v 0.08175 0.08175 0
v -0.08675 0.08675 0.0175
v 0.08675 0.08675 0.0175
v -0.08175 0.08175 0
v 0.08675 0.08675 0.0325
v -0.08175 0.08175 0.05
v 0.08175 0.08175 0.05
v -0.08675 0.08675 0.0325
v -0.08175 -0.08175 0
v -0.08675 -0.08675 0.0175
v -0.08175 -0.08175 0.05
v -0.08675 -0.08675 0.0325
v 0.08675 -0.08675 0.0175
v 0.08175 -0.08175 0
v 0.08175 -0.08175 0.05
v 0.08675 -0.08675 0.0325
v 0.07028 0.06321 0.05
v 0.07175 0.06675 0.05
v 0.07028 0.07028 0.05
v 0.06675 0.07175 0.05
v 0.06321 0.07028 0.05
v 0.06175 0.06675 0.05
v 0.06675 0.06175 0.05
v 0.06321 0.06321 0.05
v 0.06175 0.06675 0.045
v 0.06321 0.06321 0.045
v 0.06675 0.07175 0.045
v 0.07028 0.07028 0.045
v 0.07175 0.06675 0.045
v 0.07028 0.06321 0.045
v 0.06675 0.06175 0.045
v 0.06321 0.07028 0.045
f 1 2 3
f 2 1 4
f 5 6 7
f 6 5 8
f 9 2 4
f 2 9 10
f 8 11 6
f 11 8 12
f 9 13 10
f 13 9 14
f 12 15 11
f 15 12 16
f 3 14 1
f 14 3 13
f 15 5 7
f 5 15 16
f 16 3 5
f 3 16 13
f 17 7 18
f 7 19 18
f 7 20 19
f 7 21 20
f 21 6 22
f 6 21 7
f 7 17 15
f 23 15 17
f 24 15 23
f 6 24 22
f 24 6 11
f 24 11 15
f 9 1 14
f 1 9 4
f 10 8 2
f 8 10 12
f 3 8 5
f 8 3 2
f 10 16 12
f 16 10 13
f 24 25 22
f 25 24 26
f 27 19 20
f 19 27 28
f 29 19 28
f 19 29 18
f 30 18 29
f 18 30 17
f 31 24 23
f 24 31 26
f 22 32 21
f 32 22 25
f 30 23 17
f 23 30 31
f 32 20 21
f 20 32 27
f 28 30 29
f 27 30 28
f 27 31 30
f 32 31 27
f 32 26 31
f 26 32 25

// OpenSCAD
// file: FPGAHousing_base.scad
include <FPGA_shared.scad>;
use <FPGAHousing_paintcap.scad>;
use <PowerSymbol.scad>;
use <DataSymbol.scad>;

module FPGAHousing_chipcutout() {
  slotPinBaseOffset = (-slotPinEdgeCount-1)/2 * slotPinEdgeSpacing;
  slotPinEdgeOffset = slotSize/2 - slotPinSize/2 - slotPinEdgePad;
  union() {
    translate([0, 0, baseDepth/2 + slotBottom + slotPinDepth]) {
      cube(size=[slotSize, slotSize, baseDepth], center=true);
    }
    for(edge=[1:4]) rotate([0,0,90*edge]) {
      for(i=[1:slotPinEdgeCount]) {
        translate([
          slotPinBaseOffset + slotPinEdgeSpacing*i,
          slotPinEdgeOffset,
          slotBottom + slotPinDepth
        ]) {
          cube(size=[slotPinSize, slotPinSize, slotPinDepth*2], center=true);
        }
      }
    }
    translate([alignHoleOffset,alignHoleOffset,slotBottom + slotPinDepth])
      cylinder(h=alignHoleDepth*2, r=alignHoleRadius, center=true, $fn=alignHoleSides);
  }
}

module FPGAHousing_base() {
  middleSize = (slotSize + capSize) / 2;
  difference() {
    union() {
      translate([0,0,baseCenter])
        cube(size=[baseSize, baseSize, baseDepth], center=true);
      translate([0,0,baseTop-eps])
        cube(size=[middleSize, middleSize, capDepth*2], center=true);
    }
    translate([0,0,baseBottom])
      cube(size=[baseBackCutoutSize, baseBackCutoutSize, baseBackCutoutDepth*2], center=true);
    FPGAHousing_chipcutout();
  }
}

FPGAHousing_base();
%FPGAHousing_paintcap();
// file: Text_shared.scad
char_depth = 0.0001;

char_pixelsz = 0.02/5;
char_pheight = 5;
char_max_pwidth = 5;

function sum(list) = list * [for (_=list) 1];
function partialsum(list, end) = list * [for (i=[0:len(list)-1]) i < end ? 1 : 0];

module _Text_Line(a, b) {
  l = norm(b-a);
  f = l > 0 ? (b-a)/l : [1, 0];
  r = [f.y, -f.x];
  ea = -0.5*f;
  eb = (l+0.5)*f;
  sr = 0.5*r;
  sl = -sr;
  polygon([
    a+ea+sr,
    a+eb+sr,
    a+eb+sl,
    a+ea+sl,
  ]*char_pixelsz);
}

module _Text_Segments(pts, off=[0,0]) {
  for (i=[0:len(pts)-2]) {
    pa = pts[i];
    pb = pts[i+1];
    if (len(pa) == 2 && len(pb) == 2)
      _Text_Line(pts[i]+off, pts[i+1]+off);
  }
}

_Letters = [
  [[-2, -2], [-2, 2], [2, 2], [2, -2], [2, 0], [-2, 0]], // A
  [], // B
  [[2, -2], [-2, -2], [-2, 2], [2, 2]], // C
  [[2, 0.5], [2, -2], [-2, -2], [-2, 2], [0.5, 2], [], [3, 0], [0, 3]], // D
  [[2, -2], [-2, -2], [-2, 2], [2, 2], [], [-2, 0], [0, 0]], // E
  [[2, 2], [-2, 2], [-2, -2], [-2, 0], [0, 0]], // F
  [[0, 0], [2, 0], [2, -2], [-2, -2], [-2, 2], [2, 2]], // G
  [], // H
  [[0, -2], [0, 2]], // I
  [], // J
  [], // K
  [[-2, 2], [-2, -2], [2, -2]], // L
  [], // M
  [], // N
  [[-2, -2], [-2, 2], [2, 2], [2, -2], [-2, -2]], // O
  [[-2, -2], [-2, 2], [2, 2], [2, 0], [-2, 0]], // P
  [], // Q
  [[-2, -2], [-2, 2], [2, 2], [2, 0], [-2, 0], [1, -3]], // R
  [], // S
  [], // T
  [], // U
  [], // V
  [], // W
  [], // X
  [], // Y
  [], // Z
  [[-2, 2], [2, 2], [2, 0], [0, 0], [], [0, -2], [0, -2]], // ? for missing
];

function _Letter_Lookup(c) =
  let(
    ci=ord(c),
    li=ci-ord("A"),
    issp=ci==32,
    lps=li>=0&&li<26 ? _Letters[li] : [],
    lpf=len(lps)==0 ? _Letters[26] : lps
  ) issp ? [] : lpf;

function _Letter_Bounds(letter) =
  let(
    fletter = concat([[0, 0]], [for (l=letter) len(l)==2 ? l : [0,0]]),
    xs = [for (l=fletter) l.x],
    ys = [for (l=fletter) l.y]
  ) [min(xs), min(ys), max(xs), max(ys)];

module Text(letters) {
  lbounds = [for (l=letters) _Letter_Bounds(l)];
  lwidths = [for (b=lbounds) min(b.z-b.x+1, char_max_pwidth)];
  lmins = [for (b=lbounds) b.x];
  twid = sum(lwidths) + len(letters)-1;
  startoff = (1-twid)/2;
  offs = [for (i=[0:len(letters)-1]) startoff+i+partialsum(lwidths, i)];
  linear_extrude(height=char_depth) {
    for (i=[0:len(letters)-1]) if (len(letters[i]) > 0) {
      letter = letters[i];
      off = offs[i];
      left = off-lmins[i];
      wid = lwidths[i];
      intersection() {
        _Text_Segments(letter, [left, 0]);
        scale([char_pixelsz,char_pixelsz]) translate([off-0.5, -char_pheight/2])
          square(size=[wid, char_pheight]);
      }
    }
  }
}

module Text(text) {
  letters = [for (c=text) _Letter_Lookup(c)];
  lbounds = [for (l=letters) _Letter_Bounds(l)];
  lwidths = [for (b=lbounds) min(b.z-b.x+1, char_max_pwidth)];
  lmins = [for (b=lbounds) b.x];
  twid = sum(lwidths) + len(letters)-1;
  startoff = (1-twid)/2;
  offs = [for (i=[0:len(letters)-1]) startoff+i+partialsum(lwidths, i)];
  linear_extrude(height=char_depth) {
    for (i=[0:len(letters)-1]) if (len(letters[i]) > 0) {
      letter = letters[i];
      off = offs[i];
      left = off-lmins[i];
      wid = lwidths[i];
      intersection() {
        _Text_Segments(letter, [left, 0]);
        scale([char_pixelsz,char_pixelsz]) translate([off-0.5, -char_pheight/2])
          square(size=[wid, char_pheight]);
      }
    }
  }
}
// file: Text_FPGALOGIC.scad
include <Text_shared.scad>;

module Text_FPGALOGIC() {
  Text("FPGA LOGIC");
}

Text_FPGALOGIC();
// file: DataSymbol.scad
boxSize = 0.029;
lineSize = 0.0045;
symDepth = 0.01;
vertSeparation = 0.019;
horizSeparation = 0.018;

module DataSymbol() {
  boxVertCenter = (boxSize+vertSeparation)/2;
  boxHorizCenter = (boxSize+horizSeparation)/2;
  linear_extrude(symDepth, center=true) {
    translate([0,boxVertCenter]) square(boxSize, center=true); // top box
    translate([-boxHorizCenter,-boxVertCenter]) square(boxSize, center=true); // bottom left box
    translate([boxHorizCenter,-boxVertCenter]) square(boxSize, center=true); // bottom right box
    square([2*boxHorizCenter + lineSize, lineSize], center=true); // middle line
    translate([0, horizSeparation/4]) square([lineSize, horizSeparation/2 + lineSize], center=true); // line to top
    translate([-boxHorizCenter, -horizSeparation/4]) square([lineSize, horizSeparation/2 + lineSize], center=true); // line to bottom left
    translate([boxHorizCenter, -horizSeparation/4]) square([lineSize, horizSeparation/2 + lineSize], center=true); // line to bottom right
  }
}

DataSymbol();
// file: PowerSymbol.scad
symWidth = 0.038;
symHeight = 0.086;
symDepth = 0.01;
middleHeight = 0.0075;
topHorizOffset = 0.007;
sideVertOffset = 0.007;

module PowerSymbol() {
  linear_extrude(symDepth, center=true) {
    halfHei = symHeight/2;
    halfWid = symWidth/2;
    halfMid = middleHeight/2;
    polygon([
      [topHorizOffset, halfHei],
      [0, halfMid],
      [halfWid, sideVertOffset],
      [-topHorizOffset, -halfHei],
      [0, -halfMid],
      [-halfWid, -sideVertOffset]
    ]);
  }
}

PowerSymbol();
// file: FPGAHousing_pins.scad
include <FPGA_shared.scad>;
use <FPGAHousing_base.scad>;
use <FPGAHousing_paintcap.scad>;

module FPGAHousing_pins() {
  pinStartOffset = -(decoPinCount+1)/2 * decoPinSpacing;
  bevelSize = decoPinBevelSize * sqrt(2);

  for (edge=[0:3]) rotate([0,0,90*edge]) {
    for (pin=[1:decoPinCount]) translate([capSize/2, pinStartOffset+pin*decoPinSpacing, baseTop]) {
      difference() {
        cube(size=[decoPinLength*2, decoPinWidth, decoPinHeight*2], center=true);
        translate([decoPinLength,0,decoPinHeight]) rotate([0,45,0]) {
          cube(size=[bevelSize,decoPinWidth*2,bevelSize],center=true);
        }
      }
    }
  }
}

FPGAHousing_pins();
%FPGAHousing_base();
%FPGAHousing_paintcap();
// file: FPGAHousing_paintcap.scad
include <FPGA_shared.scad>;
use <FPGAHousing_base.scad>;

module FPGAHousing_paintcap() {
  bevelDepth = capBevel * sqrt(2);
  difference() {
    translate([0,0,baseTop]) {
      cube(size=[capSize, capSize, capDepth*2], center=true);
    }
    cube(size=[slotSize+eps*10, slotSize+eps*10, smallGridSize], center=true);
    for (edge=[1:4]) rotate([0,0,90*edge]) {
      translate([0,capSize/2,baseTop+capDepth]) rotate([45,0,0])
        cube(size=[capSize+0.1, bevelDepth, bevelDepth*2], center=true);
    }
  }
}

%FPGAHousing_base();
FPGAHousing_paintcap();
// file: FPGAHousing_logicbase.scad
include <FPGA_shared.scad>;
use <FPGAHousing_base.scad>;
use <FPGAHousing_paintcap.scad>;
use <PowerSymbol.scad>;
use <DataSymbol.scad>;

module FPGAHousing_logicbase() {
  difference() {
    FPGAHousing_base();
    cablecutout();
    rotate([0,0,180]) cablecutout();
  }
}

FPGAHousing_logicbase();
%FPGAHousing_paintcap();
%translate([0.067,0.25,-0.001]) rotate([-90, 0, 0]) PowerSymbol();
%translate([0.073,-0.25,0.001]) rotate([90, 0, 0]) DataSymbol();
// file: Text_FPGA.scad
include <Text_shared.scad>;

module Text_FPGA() {
  Text("FPGA");
}

Text_FPGA();
// file: FPGAChip_pins.scad
include <FPGA_shared.scad>;
use <FPGAChip_base.scad>;

module FPGAPin() {
  pinTop = chipTotalHeight/2 - chipBaseHeight/2 + pinHorizHeight/2;
  pinVCenter = pinTop - pinTotalHeight/2;
  pinBottomInnerEdge = pinHorizUnderLength + pinVertInnerOffset;
  pinInnerHeight = pinTotalHeight - pinHorizHeight;
  pinInnerAngle = atan2(-pinVertInnerOffset, pinInnerHeight);
  pinInnerCutoutHeight = pinInnerHeight / cos(pinInnerAngle);
  pinBottomOuterEdge = pinHorizLength - pinVertOuterOffset;
  pinOuterAngle = atan2(pinVertOuterOffset, pinTotalHeight);
  pinBottomNarrowEdge = pinHorizWidth/2 - pinVertNarrowOffset;
  pinNarrowAngle = atan2(pinVertNarrowOffset, pinTotalHeight);
  translate([0,0,pinVCenter]) difference() {
    translate([0, 0, 0])
      cube(size=[pinHorizLength*2, pinHorizWidth, pinTotalHeight], center=true);
    translate([pinHorizUnderLength-pinHorizLength, 0, -pinHorizHeight])
      cube(size=[pinHorizLength*2, pinHorizWidth*2, pinTotalHeight], center=true);
    translate([pinBottomInnerEdge,0,-pinHorizHeight/2-pinInnerHeight/2])
      rotate([0,pinInnerAngle,0])
      translate([-pinVertInnerOffset,0,0])
        cube(size=[pinVertInnerOffset*2, pinHorizWidth*2, pinInnerCutoutHeight*2], center=true);
    translate([pinBottomOuterEdge,0,-pinTotalHeight/2])
      rotate([0,pinOuterAngle,0])
      translate([pinVertOuterOffset,0,0])
        cube(size=[pinVertOuterOffset*2, pinHorizWidth*2, pinTotalHeight*4], center=true);
    translate([0,pinBottomNarrowEdge,-pinTotalHeight/2])
      rotate([-pinNarrowAngle,0,0])
      translate([0,pinVertNarrowOffset,0])
        cube(size=[pinHorizLength*4,pinVertNarrowOffset*2, pinTotalHeight*4], center=true);
    translate([0,-pinBottomNarrowEdge,-pinTotalHeight/2])
      rotate([pinNarrowAngle,0,0])
      translate([0,-pinVertNarrowOffset,0])
        cube(size=[pinHorizLength*4,pinVertNarrowOffset*2, pinTotalHeight*4], center=true);
  }
}

module FPGAChip_pins() {
  for (edge=[0:3])
    for (off=[1:slotPinEdgeCount])
      rotate([0,0,90*edge])
        translate([chipBaseSize/2, slotPinEdgeSpacing * (off - (slotPinEdgeCount+1)/2), 0])
        FPGAPin();
}

FPGAChip_pins();
%FPGAChip_base();
// file: FPGAHousing_logicfull.scad
use <FPGAHousing_logicbase.scad>;
use <FPGAHousing_paintcap.scad>;
use <FPGAHousing_pins.scad>;
use <PowerSymbol.scad>;
use <DataSymbol.scad>;
use <Text_FPGALOGIC.scad>;

module FPGAHousing_logicfull() {
  color("#444") FPGAHousing_logicbase();
  color("#444") FPGAHousing_paintcap();
  color("#FFF") FPGAHousing_pins();
  color("#F00") translate([0.067,0.25,-0.001]) rotate([-90, 0, 0]) PowerSymbol();
  color("#0F0") translate([0.073,-0.25,0.001]) rotate([90, 0, 0]) DataSymbol();
  color("#FFF") translate([0,0.16,0.095]) Text_FPGALOGIC();
}

FPGAHousing_logicfull();
// file: FPGA_shared.scad
smallGridSize = 0.5;
baseSize = smallGridSize;
baseTop = 0.05;
baseBottom = -0.045;
baseDepth = baseTop - baseBottom;
baseCenter = (baseTop + baseBottom)/2;
baseBackRim = 0.02;
baseBackCutoutSize = baseSize - baseBackRim*2;
baseBackCutoutDepth = 0.01;
capSize = 0.41;
capDepth = 0.045;
capBevel = 0.01;
slotSize = smallGridSize * 0.5;
slotBottom = 0.03;
slotPinEdgeCount = 4;
slotPinEdgePad = 0.01;
slotPinEdgeSpacing = 0.045;
slotPinSize = 0.025;
slotPinDepth = 0.025;
eps = 0.00001;
chipTotalSize = slotSize - slotPinEdgePad*2 - slotPinSize/2;
chipTotalHeight = 0.1;
chipBaseHeight = 0.05;
pinHorizLength = 0.022;
pinHorizUnderLength = 0.008;
pinHorizWidth = 0.02;
pinHorizHeight = 0.015;
pinVertInnerOffset = 0.003;
pinVertOuterOffset = 0.003;
pinVertNarrowOffset = 0.003;
pinTotalHeight = chipTotalHeight - chipBaseHeight/2 + pinHorizHeight/2;
chipBaseSize = chipTotalSize - pinHorizLength*2;
chipBaseBevelSize = 0.005;
alignHoleRadius = 0.005;
alignHoleOffset = chipBaseSize/2 - 0.02;
alignHoleDepth = 0.005;
alignHoleSides = 8;
decoPinCount = 8;
decoPinWidth = 0.036;
decoPinLength = 0.034;
decoPinHeight = 0.028;
decoPinSpacing = 0.049;
decoPinBevelSize = 0.010;

module cablecutout() {
  cableradius = 0.025;
  cableDepth = 0.0125;
  translate([0,smallGridSize/2,0]) rotate([90,0,0]) {
    cylinder(h=cableDepth*2, r=cableradius, center=true, $fn=8);
  }
}
// main file
include <FPGA_shared.scad>;
use <FPGAHousing_logicfull.scad>;
use <FPGAChip_pins.scad>;
use <Text_FPGA.scad>;

module FPGAChip_base() {
  bevelHeight = (chipBaseHeight - pinHorizHeight)/2;
  bevelAngle = atan2(chipBaseBevelSize, bevelHeight);
  translate([0, 0, chipTotalHeight/2 - chipBaseHeight/2]) difference() {
    cube(size=[chipBaseSize, chipBaseSize, chipBaseHeight], center=true);
    for (side=[0:3]) rotate([0,0,90*side])
      for (vside = [-1:2:1])
        translate([0,chipBaseSize/2,vside*pinHorizHeight/2])
          rotate([vside*bevelAngle,0,0])
          translate([0,chipBaseBevelSize,0])
            cube(size=[chipBaseSize*2,chipBaseBevelSize*2,bevelHeight*4], center=true);
    translate([alignHoleOffset,alignHoleOffset,chipBaseHeight/2])
      cylinder(h=alignHoleDepth*2, r=alignHoleRadius, center=true, $fn=alignHoleSides);
  }
}

FPGAChip_base();
%FPGAChip_pins();
%translate([0,0,0.05]) Text_FPGA();
*%translate([0,0,-slotBottom-chipTotalHeight/2]) FPGAHousing_logicfull();
